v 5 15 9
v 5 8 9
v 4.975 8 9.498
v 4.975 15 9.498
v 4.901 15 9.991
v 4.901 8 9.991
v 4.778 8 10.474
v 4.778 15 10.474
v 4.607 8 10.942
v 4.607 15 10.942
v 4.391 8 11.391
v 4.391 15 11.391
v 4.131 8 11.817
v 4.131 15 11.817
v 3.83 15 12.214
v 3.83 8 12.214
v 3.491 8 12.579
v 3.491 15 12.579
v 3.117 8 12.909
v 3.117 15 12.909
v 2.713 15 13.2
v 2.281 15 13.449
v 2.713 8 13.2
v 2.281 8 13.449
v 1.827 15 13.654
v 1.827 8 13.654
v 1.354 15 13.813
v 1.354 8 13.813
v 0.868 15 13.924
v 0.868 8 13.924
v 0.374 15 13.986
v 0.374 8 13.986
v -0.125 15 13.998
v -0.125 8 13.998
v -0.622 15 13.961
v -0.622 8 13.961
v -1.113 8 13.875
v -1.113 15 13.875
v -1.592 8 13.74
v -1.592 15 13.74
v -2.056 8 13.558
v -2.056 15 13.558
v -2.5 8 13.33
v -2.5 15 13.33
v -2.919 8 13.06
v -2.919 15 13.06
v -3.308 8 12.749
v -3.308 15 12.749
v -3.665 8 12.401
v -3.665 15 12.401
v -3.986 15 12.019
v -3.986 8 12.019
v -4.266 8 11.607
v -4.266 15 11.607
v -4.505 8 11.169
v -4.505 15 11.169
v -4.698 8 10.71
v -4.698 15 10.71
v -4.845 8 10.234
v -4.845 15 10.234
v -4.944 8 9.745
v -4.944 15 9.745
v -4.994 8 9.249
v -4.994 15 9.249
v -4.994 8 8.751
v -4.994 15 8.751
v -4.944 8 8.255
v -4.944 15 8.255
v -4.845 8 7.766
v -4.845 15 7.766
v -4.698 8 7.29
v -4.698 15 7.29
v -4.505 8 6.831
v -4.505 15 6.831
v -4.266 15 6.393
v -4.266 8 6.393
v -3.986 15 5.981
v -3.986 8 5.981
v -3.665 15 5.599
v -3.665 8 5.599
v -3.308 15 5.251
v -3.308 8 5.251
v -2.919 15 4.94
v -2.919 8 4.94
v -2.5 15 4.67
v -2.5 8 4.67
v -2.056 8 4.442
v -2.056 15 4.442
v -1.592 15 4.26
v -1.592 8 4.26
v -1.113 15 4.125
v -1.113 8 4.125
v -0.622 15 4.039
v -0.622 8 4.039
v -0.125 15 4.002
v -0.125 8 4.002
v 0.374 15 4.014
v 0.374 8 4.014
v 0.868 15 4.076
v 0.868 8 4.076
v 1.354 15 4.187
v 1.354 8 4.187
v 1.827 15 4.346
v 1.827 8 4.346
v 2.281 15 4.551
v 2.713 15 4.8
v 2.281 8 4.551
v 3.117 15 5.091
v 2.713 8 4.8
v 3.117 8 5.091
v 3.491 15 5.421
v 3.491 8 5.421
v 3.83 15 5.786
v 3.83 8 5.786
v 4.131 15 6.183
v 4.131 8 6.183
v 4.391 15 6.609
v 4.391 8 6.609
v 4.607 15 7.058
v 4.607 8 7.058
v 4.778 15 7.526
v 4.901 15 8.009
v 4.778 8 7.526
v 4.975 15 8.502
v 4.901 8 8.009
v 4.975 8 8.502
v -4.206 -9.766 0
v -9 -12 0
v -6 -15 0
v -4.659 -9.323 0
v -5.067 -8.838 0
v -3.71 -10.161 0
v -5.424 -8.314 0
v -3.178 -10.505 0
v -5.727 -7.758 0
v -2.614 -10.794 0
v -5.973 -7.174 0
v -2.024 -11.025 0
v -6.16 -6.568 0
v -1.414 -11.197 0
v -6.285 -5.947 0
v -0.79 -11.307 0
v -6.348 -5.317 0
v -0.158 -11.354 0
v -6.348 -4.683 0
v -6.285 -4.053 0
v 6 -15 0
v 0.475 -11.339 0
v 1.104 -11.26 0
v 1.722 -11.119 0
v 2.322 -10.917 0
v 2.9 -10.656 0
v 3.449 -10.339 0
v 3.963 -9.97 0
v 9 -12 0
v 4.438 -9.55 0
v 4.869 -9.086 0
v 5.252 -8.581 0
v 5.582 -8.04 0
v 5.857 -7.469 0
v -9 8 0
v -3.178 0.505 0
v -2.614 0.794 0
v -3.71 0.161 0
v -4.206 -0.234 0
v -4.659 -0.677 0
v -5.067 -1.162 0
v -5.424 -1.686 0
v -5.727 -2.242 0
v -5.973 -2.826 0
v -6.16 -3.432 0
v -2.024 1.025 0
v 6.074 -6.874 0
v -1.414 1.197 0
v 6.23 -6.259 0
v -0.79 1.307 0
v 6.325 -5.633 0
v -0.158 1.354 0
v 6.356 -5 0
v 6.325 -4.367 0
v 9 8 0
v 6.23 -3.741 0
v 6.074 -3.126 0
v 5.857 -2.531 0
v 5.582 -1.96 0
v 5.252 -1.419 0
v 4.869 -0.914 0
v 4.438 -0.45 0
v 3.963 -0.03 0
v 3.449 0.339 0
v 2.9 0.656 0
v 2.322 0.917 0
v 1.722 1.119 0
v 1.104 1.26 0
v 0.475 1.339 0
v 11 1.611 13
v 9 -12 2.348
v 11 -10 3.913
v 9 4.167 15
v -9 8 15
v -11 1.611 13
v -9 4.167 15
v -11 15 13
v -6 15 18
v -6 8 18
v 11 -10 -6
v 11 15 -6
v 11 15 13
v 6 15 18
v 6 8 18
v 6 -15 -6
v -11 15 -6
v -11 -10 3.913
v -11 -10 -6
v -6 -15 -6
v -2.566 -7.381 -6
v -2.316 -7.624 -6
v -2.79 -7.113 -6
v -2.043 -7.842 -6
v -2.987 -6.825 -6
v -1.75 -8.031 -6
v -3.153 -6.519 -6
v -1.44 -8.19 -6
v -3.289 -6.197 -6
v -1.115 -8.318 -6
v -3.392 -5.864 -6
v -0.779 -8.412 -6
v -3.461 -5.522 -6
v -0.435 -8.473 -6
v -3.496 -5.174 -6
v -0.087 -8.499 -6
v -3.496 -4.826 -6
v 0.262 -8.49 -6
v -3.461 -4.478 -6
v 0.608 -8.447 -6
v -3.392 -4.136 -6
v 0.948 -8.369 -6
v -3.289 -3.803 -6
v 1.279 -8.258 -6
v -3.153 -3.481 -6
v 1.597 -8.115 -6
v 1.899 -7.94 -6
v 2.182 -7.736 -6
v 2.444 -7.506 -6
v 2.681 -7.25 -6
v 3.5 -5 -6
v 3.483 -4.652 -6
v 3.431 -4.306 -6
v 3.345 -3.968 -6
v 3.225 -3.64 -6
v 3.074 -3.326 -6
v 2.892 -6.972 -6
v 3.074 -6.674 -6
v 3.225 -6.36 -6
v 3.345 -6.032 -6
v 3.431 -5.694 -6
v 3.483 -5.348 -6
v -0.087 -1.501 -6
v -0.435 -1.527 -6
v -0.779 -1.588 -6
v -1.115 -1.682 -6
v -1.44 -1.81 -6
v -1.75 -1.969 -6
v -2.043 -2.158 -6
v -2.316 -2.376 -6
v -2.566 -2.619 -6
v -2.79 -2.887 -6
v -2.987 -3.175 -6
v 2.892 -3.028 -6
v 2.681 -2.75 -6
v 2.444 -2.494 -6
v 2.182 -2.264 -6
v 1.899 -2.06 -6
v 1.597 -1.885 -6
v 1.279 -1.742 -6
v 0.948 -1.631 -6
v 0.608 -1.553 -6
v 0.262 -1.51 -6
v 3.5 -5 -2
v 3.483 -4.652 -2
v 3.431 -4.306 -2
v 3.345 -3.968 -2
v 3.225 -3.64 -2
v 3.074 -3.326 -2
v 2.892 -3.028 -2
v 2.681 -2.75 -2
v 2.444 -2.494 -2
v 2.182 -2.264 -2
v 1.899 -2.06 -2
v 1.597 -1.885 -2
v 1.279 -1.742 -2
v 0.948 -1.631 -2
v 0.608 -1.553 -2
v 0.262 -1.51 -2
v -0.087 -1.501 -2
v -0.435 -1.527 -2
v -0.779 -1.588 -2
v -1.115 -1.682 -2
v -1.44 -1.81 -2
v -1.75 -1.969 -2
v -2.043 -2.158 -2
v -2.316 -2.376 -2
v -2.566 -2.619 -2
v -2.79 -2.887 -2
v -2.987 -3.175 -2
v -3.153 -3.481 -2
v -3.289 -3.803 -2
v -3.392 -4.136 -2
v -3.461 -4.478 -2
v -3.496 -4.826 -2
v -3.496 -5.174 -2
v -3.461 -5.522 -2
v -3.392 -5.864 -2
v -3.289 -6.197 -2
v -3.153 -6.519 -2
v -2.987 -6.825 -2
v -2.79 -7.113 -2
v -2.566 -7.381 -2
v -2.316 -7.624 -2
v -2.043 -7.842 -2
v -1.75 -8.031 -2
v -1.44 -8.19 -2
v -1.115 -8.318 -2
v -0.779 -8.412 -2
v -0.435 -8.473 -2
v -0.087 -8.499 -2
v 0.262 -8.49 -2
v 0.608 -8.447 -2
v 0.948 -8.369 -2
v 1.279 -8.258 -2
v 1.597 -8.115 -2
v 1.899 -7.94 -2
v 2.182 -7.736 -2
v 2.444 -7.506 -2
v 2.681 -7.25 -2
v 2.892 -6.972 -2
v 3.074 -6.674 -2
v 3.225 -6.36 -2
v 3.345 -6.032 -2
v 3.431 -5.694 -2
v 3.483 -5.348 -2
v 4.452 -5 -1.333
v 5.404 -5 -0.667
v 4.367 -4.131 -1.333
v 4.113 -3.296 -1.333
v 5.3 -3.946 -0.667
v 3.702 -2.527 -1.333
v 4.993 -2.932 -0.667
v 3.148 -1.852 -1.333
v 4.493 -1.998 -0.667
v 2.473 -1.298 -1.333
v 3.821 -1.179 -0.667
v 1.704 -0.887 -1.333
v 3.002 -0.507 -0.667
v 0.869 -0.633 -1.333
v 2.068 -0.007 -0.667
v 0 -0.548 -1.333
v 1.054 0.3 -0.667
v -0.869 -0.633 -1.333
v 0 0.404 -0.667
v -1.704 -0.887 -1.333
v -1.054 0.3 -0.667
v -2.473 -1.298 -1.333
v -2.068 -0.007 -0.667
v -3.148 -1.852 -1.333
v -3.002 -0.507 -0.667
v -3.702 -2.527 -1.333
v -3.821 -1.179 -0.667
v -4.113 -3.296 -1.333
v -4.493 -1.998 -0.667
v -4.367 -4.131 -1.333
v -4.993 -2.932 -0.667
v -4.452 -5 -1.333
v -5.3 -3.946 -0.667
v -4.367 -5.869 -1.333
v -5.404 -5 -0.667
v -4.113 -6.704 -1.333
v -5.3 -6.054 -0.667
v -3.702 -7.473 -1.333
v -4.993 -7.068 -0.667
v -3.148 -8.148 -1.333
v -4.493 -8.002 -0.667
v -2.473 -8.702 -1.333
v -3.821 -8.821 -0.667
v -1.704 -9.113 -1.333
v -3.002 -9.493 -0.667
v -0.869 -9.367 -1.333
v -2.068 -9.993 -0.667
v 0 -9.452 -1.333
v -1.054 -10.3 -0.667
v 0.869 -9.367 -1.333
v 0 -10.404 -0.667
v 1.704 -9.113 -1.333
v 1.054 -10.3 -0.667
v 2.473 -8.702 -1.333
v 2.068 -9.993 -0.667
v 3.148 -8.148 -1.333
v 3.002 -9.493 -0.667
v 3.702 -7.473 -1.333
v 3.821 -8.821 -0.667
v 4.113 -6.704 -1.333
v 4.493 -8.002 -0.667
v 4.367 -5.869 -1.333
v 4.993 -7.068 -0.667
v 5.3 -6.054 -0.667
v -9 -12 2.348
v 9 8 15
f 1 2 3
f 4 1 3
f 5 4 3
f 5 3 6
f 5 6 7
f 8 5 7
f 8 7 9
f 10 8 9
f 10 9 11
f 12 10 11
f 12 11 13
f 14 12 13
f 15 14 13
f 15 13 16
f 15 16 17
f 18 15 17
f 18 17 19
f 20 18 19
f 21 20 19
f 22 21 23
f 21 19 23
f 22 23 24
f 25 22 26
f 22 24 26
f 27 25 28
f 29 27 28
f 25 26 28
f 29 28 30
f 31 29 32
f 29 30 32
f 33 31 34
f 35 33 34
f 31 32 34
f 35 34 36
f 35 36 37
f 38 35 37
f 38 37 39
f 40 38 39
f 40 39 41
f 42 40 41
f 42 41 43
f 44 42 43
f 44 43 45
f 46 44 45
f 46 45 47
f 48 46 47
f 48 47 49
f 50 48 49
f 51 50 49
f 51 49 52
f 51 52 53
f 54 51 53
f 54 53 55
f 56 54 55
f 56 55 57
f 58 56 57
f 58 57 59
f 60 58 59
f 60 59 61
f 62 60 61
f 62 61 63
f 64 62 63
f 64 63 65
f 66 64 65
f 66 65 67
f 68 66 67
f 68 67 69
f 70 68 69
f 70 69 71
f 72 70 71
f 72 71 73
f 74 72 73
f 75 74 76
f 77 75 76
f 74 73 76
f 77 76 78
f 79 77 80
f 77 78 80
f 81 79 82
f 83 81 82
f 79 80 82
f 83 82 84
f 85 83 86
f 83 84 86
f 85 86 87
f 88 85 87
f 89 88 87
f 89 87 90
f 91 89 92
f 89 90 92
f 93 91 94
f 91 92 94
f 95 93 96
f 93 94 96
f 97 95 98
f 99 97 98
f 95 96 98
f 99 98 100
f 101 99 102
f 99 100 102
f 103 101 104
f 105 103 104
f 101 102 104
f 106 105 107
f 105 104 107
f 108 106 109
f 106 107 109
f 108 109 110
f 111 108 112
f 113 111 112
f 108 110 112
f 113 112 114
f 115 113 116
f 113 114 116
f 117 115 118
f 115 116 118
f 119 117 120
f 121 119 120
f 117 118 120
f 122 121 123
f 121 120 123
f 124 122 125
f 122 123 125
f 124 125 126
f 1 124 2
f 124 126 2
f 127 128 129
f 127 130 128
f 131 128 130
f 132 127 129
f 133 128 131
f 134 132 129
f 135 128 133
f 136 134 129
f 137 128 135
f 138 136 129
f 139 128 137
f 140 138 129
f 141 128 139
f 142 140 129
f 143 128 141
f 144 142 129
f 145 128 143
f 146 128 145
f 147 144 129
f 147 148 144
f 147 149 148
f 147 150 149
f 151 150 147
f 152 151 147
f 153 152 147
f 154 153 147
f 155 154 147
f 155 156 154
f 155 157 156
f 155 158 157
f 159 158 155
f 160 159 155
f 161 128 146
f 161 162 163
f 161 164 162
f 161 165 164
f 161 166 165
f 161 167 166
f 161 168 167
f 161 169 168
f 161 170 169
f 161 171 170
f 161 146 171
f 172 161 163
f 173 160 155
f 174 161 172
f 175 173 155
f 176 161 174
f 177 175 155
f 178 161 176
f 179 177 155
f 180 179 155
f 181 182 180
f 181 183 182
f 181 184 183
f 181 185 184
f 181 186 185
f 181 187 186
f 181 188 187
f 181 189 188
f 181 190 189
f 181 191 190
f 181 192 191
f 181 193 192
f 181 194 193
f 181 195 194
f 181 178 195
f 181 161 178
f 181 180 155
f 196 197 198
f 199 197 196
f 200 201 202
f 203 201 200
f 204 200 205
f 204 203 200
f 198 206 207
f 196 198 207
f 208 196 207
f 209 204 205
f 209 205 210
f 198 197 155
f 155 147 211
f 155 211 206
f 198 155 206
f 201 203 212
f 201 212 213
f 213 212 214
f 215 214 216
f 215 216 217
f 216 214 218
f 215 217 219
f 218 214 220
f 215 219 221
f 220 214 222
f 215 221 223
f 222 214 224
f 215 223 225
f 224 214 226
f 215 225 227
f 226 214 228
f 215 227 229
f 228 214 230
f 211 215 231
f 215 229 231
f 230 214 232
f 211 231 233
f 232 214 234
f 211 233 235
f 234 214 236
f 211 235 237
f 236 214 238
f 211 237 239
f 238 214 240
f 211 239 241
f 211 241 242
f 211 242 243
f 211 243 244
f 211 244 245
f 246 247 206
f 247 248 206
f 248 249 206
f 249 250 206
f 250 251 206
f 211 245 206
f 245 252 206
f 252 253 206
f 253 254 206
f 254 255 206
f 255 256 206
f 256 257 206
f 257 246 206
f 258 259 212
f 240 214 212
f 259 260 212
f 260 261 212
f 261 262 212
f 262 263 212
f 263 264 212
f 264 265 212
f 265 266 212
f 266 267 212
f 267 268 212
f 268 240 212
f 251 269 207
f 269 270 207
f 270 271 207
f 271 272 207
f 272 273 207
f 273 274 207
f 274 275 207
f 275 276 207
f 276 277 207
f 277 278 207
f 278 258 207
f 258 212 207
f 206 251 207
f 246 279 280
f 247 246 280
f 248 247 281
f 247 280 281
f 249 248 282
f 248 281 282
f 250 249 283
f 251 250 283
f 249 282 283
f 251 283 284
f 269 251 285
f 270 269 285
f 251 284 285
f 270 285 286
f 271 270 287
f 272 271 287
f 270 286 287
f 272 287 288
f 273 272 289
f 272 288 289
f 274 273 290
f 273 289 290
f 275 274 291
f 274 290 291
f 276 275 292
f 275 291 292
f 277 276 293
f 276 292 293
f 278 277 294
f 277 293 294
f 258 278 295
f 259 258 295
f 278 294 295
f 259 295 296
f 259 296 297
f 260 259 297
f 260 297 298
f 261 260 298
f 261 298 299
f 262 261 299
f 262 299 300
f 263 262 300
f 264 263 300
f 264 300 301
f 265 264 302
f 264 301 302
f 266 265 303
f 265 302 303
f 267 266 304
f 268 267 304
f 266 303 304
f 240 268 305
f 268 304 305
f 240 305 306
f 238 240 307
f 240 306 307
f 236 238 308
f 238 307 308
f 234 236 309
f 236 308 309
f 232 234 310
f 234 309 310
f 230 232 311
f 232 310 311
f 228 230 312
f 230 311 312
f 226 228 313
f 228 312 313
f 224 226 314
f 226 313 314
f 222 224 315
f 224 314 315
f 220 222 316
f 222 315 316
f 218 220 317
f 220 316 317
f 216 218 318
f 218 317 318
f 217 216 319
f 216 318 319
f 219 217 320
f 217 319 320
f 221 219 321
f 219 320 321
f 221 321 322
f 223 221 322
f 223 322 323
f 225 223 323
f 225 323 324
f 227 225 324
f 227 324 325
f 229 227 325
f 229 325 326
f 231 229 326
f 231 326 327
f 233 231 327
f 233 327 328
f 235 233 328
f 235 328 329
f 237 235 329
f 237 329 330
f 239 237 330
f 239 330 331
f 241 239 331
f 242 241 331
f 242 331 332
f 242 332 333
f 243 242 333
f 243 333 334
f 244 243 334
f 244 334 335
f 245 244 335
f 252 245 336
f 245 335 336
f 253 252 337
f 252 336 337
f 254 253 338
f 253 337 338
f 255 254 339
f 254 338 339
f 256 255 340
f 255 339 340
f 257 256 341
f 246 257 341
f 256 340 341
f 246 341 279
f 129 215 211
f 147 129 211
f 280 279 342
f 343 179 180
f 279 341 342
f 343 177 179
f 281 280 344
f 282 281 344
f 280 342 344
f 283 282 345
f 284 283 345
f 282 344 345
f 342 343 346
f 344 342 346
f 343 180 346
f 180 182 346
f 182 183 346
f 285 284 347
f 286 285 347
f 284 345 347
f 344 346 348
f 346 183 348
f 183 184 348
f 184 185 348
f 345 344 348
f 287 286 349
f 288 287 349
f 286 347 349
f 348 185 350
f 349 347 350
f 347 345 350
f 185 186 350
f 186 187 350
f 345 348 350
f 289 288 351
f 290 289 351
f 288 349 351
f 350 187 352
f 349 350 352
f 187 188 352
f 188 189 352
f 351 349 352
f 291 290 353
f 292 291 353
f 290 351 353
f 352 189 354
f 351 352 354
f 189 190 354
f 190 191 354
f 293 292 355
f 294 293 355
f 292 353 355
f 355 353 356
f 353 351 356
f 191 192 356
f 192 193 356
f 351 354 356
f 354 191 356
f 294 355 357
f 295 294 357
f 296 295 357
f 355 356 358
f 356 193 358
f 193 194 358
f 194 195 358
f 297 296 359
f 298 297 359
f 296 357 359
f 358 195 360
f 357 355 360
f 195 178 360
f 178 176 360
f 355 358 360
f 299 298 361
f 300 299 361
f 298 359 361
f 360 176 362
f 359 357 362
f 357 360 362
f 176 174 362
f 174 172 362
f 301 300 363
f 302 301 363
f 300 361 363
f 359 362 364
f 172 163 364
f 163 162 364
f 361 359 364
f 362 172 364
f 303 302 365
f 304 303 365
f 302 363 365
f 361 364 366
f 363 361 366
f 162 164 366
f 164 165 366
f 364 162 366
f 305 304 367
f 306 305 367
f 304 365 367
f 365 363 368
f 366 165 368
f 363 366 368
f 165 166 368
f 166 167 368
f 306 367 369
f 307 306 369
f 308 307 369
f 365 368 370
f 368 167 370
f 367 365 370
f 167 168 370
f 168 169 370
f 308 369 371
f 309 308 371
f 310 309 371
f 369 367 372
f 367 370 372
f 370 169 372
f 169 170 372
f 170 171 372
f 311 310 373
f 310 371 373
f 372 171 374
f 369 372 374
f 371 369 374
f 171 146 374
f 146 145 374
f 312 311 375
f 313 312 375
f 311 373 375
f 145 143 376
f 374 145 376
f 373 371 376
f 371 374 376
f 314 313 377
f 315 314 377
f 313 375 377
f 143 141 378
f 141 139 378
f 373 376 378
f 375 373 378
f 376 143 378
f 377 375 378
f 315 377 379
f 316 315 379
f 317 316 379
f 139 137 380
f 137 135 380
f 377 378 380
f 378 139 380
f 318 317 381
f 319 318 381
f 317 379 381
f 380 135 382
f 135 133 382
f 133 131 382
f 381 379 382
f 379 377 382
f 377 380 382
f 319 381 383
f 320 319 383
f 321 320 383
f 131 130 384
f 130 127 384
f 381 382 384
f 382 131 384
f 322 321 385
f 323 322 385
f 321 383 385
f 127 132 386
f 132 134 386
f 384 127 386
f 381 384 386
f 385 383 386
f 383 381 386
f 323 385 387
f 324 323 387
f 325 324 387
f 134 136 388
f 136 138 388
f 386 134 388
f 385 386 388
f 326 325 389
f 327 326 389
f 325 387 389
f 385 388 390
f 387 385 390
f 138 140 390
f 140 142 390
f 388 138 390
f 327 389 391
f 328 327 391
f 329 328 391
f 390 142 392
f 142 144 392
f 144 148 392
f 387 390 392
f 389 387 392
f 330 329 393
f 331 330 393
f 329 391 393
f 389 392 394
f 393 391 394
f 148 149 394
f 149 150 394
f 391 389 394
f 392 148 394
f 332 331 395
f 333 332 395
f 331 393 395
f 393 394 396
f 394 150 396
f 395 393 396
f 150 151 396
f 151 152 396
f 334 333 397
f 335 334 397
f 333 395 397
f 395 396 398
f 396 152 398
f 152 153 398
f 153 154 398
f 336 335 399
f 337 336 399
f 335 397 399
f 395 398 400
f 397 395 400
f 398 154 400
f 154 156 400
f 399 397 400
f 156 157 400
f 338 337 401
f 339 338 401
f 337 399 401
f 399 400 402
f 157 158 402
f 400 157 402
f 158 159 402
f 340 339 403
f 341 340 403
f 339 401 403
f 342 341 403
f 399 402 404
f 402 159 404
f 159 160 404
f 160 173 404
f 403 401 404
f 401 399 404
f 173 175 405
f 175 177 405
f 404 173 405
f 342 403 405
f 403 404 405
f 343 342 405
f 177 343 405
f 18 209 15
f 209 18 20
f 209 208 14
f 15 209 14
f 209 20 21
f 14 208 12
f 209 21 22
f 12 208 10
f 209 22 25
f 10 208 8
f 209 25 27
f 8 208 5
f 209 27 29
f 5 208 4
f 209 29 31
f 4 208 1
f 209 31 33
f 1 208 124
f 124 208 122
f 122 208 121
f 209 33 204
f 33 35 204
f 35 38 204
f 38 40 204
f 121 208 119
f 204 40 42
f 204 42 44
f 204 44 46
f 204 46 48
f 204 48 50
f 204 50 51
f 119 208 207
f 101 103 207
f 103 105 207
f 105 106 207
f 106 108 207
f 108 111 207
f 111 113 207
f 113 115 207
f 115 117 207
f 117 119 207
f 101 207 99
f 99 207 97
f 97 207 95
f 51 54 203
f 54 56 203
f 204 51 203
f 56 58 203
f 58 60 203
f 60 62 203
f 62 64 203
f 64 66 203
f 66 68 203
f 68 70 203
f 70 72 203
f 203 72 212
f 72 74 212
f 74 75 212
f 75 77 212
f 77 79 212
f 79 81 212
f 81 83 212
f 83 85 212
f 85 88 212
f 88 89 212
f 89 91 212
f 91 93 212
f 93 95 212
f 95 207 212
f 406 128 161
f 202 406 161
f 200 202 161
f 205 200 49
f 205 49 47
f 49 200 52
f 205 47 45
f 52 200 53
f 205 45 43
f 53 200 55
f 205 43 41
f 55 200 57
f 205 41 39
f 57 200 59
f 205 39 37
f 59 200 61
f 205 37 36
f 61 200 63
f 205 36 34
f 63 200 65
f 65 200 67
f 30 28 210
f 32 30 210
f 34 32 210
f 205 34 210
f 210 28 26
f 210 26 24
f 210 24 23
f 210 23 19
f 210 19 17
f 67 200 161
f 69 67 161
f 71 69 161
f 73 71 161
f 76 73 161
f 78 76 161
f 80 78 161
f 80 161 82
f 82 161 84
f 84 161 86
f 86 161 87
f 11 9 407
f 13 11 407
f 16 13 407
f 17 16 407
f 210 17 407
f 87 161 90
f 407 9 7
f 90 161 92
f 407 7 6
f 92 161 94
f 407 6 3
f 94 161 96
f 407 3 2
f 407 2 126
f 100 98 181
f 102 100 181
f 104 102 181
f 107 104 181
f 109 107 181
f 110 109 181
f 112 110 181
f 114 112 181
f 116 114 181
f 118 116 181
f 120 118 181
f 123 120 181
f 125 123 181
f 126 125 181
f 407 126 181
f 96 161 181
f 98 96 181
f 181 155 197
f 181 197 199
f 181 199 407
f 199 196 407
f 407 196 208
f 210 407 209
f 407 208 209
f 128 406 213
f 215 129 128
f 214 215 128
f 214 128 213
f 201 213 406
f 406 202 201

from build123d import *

# Parameters (mm, degrees)
F0_W        = 2
F0_H        = 23
F0_W_2      = 18
F0_R        = 3.5
F1_DEPTH    = 6
F2_DEPTH    = 18
F3_R        = 5
F4_DEPTH    = 25
F5_SIZE2    = 23
F5_SIZE     = 18
F6_T1_DEPTH = 31.7168298797
F6_T3_DEPTH = 32.7168298797
F7_SIZE2    = 2.8562960135
F7_SIZE     = 2


# Not quite as in the source:
# - a fillet or chamfer that OpenCascade refuses, or shapes differently, is made with other operations: its cross-section is extruded or revolved along the edge and cut away or added


with BuildPart() as f1:
    # F0 (on Top) → F1 (new body)
    with BuildSketch(Plane.XY):
        with Locations((-10, -3.5)):
            Rectangle(F0_W, F0_H)
        with Locations((0, -3.5)):
            Rectangle(F0_W_2, F0_H)
        with Locations((0, -5)):
            Circle(F0_R, mode=Mode.SUBTRACT)
        with Locations((10, -3.5)):
            Rectangle(F0_W, F0_H)
        Polygon((9, 8), (11, 8), (11, 15), (-11, 15), (-11, 8), (-9, 8), align=None)
    extrude(amount=-F1_DEPTH)

    # F0 (on Top) → F2 (join)
    with BuildSketch(Plane.XY):
        Polygon((9, 8), (11, 8), (11, 15), (-11, 15), (-11, 8), (-9, 8), align=None)
        with Locations((-10, -3.5)):
            Rectangle(F0_W, F0_H)
        with Locations((10, -3.5)):
            Rectangle(F0_W, F0_H)
    extrude(amount=F2_DEPTH)

    # F3 (on face) → F4 (cut)
    with BuildSketch(Plane.XZ.offset(-8)):
        with Locations((0, 9)):
            Circle(F3_R)
    extrude(amount=-F4_DEPTH, mode=Mode.SUBTRACT)

    # F5
    f5_edges = [f1.edges().sort_by_distance(p)[0] for p in [
        (-10, -15, 18),
        (10, -15, 18),
    ]]
    f5_side = f1.faces().sort_by_distance((0, -15, -5.674424))[0]
    chamfer(f5_edges, length=F5_SIZE, length2=F5_SIZE2, reference=f5_side)

    # F6: chamfer of 5 on 4 edges, made by hand

    # F6_s2 → F6_t1 (cut)
    with BuildSketch(Plane.XY.offset(-18.8584149398)):
        Polygon((6, -15), (11, -10), (11, -15), align=None)
        Polygon((-6, -15), (-11, -10), (-11, -15), align=None)
    extrude(amount=F6_T1_DEPTH, mode=Mode.SUBTRACT)

    # F6_s4 → F6_t3 (cut)
    with BuildSketch(Plane.XZ.offset(-27.8584149398)):
        Polygon((11, 13), (6, 18), (11, 18), align=None)
        Polygon((-11, 13), (-6, 18), (-11, 18), align=None)
    extrude(amount=F6_T3_DEPTH, mode=Mode.SUBTRACT)

    # F7
    f7_edges = [f1.edges().sort_by_distance(p)[0] for p in [
        (-3.5, -5, 0),
    ]]
    f7_side = f1.faces().sort_by_distance((-3.5, -5, -3))[0]
    chamfer(f7_edges, length=F7_SIZE, length2=F7_SIZE2, reference=f7_side)


solid = f1.part
